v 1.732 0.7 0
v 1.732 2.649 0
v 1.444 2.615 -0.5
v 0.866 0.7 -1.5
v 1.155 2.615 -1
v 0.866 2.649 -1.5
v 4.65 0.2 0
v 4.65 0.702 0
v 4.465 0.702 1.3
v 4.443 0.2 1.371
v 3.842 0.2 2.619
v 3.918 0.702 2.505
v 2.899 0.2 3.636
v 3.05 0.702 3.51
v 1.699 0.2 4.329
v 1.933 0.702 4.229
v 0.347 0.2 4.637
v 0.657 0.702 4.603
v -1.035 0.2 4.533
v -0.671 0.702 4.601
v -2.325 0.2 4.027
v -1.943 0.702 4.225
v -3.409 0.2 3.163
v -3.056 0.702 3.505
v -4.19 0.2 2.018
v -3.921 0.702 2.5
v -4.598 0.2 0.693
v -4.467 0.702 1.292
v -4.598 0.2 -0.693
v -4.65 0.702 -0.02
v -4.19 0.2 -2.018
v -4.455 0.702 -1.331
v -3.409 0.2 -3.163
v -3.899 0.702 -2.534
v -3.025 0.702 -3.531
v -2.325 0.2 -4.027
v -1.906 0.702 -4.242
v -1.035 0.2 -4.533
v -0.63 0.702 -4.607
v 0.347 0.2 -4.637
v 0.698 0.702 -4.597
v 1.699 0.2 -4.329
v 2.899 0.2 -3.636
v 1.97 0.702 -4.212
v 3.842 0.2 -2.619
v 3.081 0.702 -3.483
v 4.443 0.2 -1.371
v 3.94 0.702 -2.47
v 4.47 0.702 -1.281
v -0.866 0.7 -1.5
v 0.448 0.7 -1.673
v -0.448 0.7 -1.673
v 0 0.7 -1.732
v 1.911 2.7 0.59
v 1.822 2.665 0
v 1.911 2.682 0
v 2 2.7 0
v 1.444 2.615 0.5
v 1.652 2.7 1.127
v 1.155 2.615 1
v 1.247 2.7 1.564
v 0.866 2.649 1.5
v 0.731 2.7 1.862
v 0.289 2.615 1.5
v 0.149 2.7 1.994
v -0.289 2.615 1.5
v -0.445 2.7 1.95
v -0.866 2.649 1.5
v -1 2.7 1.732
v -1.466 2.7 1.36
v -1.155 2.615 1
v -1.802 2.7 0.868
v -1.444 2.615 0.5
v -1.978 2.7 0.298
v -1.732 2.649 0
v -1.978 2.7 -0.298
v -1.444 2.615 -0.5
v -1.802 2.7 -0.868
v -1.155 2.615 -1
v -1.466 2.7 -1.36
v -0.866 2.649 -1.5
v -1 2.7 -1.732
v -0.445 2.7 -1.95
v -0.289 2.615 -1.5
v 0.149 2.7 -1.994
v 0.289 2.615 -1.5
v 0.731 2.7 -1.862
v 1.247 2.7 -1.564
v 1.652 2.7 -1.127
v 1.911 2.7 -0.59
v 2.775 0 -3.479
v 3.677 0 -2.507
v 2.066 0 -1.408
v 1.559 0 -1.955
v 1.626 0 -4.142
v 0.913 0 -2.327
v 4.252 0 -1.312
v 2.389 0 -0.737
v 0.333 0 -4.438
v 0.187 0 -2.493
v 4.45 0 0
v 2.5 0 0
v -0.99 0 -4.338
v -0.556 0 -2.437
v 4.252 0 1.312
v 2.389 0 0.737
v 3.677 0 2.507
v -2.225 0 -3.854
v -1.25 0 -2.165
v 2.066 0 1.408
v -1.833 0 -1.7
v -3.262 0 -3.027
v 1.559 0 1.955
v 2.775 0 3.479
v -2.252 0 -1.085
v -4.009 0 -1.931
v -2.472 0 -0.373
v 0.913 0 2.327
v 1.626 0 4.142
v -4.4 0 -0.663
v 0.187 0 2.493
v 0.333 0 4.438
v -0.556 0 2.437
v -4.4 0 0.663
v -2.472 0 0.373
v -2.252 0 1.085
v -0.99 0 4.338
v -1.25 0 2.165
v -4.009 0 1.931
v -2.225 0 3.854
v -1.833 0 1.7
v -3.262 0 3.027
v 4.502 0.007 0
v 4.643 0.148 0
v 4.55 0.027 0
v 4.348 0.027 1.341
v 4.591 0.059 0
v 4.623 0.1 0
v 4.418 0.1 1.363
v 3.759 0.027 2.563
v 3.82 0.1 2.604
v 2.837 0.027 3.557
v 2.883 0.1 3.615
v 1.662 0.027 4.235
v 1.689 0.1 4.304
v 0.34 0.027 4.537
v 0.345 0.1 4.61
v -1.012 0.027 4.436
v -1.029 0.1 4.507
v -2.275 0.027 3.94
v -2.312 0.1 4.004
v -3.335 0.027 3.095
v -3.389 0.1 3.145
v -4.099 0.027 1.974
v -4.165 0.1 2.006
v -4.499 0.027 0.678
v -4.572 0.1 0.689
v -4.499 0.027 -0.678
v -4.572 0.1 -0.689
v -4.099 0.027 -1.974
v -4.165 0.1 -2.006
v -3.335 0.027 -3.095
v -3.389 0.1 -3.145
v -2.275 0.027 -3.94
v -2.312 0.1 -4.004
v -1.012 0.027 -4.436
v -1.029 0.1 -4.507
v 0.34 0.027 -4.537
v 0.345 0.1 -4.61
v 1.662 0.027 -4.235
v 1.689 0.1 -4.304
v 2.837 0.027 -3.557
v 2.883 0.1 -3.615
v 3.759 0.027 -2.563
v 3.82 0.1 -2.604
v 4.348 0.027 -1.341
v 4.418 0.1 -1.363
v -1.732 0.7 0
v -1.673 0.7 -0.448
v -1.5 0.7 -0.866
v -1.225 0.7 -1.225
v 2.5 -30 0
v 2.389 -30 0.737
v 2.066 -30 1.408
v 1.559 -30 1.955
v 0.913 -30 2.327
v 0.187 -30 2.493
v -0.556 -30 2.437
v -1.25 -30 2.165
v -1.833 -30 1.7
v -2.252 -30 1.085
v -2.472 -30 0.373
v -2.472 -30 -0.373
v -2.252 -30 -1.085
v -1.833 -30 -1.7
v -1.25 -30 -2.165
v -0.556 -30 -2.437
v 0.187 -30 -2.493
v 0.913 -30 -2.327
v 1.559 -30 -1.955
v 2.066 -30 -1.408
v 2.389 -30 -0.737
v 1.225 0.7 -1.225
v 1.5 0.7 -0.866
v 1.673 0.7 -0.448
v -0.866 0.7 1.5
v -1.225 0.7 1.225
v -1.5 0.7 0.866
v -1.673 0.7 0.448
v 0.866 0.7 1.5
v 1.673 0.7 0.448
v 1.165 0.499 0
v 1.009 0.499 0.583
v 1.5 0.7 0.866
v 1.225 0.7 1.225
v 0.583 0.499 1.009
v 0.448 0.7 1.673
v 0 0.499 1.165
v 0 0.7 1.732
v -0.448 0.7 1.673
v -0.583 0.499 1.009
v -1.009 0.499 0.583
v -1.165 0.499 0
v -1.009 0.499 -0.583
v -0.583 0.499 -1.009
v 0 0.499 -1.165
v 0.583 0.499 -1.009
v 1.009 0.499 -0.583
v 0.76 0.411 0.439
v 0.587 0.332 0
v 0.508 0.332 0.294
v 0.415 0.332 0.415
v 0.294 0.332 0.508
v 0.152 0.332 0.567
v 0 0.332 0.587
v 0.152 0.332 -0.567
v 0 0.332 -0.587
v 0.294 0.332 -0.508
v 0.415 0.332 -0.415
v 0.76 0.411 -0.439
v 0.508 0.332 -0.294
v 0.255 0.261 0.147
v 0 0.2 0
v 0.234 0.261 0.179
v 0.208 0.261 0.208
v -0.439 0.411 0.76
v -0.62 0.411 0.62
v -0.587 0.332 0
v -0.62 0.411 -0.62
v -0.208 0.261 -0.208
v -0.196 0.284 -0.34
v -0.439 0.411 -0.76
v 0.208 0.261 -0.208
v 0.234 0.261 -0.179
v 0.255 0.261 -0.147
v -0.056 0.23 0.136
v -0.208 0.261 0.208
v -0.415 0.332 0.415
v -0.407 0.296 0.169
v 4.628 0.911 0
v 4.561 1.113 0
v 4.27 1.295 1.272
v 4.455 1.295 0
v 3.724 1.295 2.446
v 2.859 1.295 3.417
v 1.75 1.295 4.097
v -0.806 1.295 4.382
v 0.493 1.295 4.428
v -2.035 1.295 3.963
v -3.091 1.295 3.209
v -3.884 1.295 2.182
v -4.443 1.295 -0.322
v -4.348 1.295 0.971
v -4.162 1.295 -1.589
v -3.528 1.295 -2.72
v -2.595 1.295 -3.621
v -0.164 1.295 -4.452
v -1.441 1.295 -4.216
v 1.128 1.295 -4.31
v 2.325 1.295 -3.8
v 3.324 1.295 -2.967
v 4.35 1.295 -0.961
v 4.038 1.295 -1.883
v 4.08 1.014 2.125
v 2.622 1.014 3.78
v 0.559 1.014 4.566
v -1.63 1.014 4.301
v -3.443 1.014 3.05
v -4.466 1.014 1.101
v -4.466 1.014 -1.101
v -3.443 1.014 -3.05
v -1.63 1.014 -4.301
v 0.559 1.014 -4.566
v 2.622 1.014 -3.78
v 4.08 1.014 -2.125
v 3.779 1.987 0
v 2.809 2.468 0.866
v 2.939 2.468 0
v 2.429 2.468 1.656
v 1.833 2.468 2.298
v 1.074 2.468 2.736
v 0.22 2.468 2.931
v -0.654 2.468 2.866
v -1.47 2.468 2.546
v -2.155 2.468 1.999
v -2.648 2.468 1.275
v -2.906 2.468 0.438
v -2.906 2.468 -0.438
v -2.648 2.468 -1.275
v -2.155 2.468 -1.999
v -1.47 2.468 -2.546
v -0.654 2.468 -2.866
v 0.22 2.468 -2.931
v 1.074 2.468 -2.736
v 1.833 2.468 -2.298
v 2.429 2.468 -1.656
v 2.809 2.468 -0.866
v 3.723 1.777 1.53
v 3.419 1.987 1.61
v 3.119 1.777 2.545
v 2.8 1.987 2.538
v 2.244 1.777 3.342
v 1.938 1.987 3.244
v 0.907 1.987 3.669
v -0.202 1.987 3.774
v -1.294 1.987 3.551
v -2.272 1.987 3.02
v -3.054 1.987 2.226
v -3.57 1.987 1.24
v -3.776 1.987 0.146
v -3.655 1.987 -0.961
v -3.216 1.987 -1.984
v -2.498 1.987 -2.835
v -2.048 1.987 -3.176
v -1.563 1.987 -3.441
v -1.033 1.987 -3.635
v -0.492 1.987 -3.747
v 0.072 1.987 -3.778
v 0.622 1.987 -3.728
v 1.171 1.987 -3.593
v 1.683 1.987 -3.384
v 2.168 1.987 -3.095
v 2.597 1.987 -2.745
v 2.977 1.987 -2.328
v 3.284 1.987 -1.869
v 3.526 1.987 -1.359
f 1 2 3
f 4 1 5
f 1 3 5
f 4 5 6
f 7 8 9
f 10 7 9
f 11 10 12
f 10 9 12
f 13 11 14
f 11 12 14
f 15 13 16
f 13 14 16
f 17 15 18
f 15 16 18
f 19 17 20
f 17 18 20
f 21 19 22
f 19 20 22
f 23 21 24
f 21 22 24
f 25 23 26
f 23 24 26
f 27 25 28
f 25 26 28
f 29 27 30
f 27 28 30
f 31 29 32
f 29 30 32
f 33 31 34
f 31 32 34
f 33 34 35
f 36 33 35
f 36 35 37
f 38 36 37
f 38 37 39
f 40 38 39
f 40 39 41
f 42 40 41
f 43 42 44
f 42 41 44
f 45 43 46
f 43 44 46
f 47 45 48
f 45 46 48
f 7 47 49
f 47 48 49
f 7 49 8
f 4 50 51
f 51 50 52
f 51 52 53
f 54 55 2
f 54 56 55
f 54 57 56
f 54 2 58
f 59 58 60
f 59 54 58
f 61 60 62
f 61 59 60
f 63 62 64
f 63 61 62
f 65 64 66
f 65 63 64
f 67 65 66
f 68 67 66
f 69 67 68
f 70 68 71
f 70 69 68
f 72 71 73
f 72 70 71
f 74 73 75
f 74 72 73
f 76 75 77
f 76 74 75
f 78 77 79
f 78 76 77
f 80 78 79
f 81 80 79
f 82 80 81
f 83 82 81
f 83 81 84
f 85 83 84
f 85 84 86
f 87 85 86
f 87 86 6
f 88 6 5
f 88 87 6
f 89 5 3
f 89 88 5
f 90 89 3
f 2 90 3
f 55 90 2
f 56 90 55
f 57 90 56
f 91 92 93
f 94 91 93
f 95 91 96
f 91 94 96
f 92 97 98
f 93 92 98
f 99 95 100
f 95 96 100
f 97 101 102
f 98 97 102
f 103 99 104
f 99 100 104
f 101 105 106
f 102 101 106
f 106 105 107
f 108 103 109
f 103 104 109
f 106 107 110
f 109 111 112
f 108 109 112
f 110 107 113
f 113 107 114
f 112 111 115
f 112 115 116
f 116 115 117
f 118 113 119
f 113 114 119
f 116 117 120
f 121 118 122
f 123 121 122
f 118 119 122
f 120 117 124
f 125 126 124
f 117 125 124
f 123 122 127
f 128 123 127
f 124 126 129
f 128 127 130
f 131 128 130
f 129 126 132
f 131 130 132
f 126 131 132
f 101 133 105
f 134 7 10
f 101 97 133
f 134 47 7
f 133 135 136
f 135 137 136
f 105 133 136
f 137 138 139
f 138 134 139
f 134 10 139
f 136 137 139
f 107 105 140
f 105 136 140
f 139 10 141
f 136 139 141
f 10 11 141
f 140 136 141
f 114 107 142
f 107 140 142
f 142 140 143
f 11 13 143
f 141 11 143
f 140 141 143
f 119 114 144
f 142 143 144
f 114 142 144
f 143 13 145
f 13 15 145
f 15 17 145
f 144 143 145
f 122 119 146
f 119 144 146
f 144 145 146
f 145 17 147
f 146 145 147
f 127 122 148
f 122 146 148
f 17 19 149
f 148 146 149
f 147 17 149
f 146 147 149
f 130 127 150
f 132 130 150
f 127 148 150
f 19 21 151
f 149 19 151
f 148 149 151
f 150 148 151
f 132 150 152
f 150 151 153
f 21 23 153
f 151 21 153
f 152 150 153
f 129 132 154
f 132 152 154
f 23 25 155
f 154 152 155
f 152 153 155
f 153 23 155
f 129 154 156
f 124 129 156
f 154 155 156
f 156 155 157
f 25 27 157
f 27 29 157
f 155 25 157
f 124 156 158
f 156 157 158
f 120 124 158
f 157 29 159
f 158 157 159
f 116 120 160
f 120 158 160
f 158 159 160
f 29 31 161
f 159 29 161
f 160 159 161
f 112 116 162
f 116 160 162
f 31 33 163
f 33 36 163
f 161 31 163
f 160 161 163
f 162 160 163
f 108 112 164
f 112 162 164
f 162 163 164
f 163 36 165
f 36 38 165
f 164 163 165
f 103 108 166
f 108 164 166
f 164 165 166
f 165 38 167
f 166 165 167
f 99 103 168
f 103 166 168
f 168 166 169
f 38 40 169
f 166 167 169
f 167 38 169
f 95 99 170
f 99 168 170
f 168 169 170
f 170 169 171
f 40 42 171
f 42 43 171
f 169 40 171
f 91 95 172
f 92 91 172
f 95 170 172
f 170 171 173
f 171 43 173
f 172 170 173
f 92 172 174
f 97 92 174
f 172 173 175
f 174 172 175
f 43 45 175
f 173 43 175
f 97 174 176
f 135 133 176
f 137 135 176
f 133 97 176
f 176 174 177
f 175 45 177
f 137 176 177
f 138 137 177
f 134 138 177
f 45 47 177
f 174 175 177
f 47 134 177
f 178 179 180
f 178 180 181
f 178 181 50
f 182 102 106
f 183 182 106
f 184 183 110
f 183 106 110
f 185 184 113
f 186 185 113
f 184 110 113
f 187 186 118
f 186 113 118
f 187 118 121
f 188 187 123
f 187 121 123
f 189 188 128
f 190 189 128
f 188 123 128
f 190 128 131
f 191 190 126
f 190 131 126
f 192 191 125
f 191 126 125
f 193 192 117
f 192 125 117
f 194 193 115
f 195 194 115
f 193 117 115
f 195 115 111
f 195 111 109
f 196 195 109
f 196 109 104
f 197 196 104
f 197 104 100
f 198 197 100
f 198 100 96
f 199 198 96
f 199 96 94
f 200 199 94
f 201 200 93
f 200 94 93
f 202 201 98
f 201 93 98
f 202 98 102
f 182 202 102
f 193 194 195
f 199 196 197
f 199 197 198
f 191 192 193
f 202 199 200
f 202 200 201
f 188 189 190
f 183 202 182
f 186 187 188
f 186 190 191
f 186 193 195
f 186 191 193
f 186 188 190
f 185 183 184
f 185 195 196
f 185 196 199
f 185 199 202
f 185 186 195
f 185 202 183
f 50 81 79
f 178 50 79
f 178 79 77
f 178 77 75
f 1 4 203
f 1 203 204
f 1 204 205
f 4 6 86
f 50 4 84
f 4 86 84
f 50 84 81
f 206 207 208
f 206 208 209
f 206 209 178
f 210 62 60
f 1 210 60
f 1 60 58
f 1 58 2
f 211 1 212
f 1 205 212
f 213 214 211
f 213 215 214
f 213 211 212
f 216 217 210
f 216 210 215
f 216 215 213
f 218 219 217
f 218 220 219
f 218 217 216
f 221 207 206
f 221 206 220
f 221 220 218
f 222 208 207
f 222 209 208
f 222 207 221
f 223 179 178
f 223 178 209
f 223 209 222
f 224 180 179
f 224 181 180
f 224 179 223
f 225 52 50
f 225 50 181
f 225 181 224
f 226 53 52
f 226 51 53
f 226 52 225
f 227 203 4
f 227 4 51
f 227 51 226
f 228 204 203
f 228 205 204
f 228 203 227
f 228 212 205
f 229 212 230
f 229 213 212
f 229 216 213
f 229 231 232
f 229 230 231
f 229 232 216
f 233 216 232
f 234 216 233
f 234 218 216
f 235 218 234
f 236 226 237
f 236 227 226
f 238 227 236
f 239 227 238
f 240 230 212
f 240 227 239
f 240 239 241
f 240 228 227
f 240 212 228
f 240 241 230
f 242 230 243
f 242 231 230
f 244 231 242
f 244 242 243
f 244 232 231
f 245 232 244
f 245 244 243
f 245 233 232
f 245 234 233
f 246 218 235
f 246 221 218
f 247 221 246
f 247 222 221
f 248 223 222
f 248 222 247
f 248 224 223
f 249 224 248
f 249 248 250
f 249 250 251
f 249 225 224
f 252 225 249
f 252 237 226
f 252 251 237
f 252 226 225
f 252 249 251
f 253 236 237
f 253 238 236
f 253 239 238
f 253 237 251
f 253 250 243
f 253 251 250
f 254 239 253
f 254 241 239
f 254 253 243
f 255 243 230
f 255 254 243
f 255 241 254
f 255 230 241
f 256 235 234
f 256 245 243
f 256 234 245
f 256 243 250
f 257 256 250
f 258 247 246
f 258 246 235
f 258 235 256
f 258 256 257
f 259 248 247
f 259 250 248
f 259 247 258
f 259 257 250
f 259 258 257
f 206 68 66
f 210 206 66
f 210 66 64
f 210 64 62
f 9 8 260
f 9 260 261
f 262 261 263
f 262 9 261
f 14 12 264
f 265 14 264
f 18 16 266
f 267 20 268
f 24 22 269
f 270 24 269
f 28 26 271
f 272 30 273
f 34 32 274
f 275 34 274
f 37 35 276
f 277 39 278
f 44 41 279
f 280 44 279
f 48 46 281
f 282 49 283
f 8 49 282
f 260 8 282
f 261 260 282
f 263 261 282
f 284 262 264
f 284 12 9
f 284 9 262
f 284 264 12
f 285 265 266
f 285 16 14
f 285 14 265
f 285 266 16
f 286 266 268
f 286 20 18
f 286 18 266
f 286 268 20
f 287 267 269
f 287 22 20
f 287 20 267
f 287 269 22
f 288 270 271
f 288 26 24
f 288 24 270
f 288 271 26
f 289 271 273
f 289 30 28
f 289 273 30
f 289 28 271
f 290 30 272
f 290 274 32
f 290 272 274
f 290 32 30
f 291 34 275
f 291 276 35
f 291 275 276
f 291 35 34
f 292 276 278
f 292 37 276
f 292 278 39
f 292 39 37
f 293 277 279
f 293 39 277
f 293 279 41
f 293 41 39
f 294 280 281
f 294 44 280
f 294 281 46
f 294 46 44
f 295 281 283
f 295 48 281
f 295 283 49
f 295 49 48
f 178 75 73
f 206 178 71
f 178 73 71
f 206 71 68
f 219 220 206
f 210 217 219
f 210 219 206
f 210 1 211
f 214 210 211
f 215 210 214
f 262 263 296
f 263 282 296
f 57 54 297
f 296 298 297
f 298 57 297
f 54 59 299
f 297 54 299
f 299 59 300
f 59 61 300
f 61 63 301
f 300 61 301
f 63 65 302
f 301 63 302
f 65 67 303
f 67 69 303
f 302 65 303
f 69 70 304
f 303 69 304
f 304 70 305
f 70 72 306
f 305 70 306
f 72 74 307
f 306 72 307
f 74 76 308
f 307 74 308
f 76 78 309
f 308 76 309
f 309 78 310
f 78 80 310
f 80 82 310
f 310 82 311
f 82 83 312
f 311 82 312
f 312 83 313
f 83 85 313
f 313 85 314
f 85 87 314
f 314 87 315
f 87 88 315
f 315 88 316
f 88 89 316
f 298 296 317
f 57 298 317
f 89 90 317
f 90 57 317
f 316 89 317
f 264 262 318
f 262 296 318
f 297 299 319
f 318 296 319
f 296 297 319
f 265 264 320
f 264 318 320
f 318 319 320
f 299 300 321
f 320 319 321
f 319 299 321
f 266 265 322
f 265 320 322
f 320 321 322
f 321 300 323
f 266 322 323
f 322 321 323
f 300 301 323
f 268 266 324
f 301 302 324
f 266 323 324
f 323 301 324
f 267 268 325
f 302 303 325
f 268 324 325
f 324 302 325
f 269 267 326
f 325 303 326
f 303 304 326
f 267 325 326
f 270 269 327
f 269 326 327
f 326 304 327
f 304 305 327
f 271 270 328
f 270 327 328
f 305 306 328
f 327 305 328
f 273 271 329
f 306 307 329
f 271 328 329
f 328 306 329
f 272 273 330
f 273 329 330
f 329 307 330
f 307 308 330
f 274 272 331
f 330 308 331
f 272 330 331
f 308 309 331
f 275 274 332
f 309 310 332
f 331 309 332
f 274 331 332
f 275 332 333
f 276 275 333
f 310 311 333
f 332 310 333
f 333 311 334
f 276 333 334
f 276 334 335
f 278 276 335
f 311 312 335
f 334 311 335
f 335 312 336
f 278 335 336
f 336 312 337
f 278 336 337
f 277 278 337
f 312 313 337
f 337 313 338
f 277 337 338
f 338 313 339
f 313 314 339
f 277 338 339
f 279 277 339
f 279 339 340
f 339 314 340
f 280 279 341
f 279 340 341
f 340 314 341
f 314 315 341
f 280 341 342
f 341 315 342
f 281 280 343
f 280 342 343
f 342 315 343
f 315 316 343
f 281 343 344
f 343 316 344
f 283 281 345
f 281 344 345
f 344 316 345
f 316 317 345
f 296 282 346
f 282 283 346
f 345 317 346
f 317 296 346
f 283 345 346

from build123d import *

# Parameters (mm, degrees)
FILLET1_R           = 0.2
FILLET2_R           = 1
SKETCH2_R           = 2.5
BOSS_EXTRUDE1_DEPTH = 30
CUT_EXTRUDE1_DEPTH  = 2


with BuildPart() as part:
    # Sketch1 → Revolve1 (revolve)
    with BuildSketch(Plane.XY):
        with BuildLine():
            Line((0, 0), (4.65, 0))
            Line((4.65, 0), (4.65, 1))
            ThreePointArc((4.65, 1), (3.526943142, 2.164793721), (2, 2.7))
            Line((2, 2.7), (0, 2.7))
            Line((0, 2.7), (0, 0))
        make_face()
    revolve(axis=Axis((0, 55, 0), (0, -1, 0)))

    # Fillet1
    fillet1_edges = [part.edges().sort_by_distance(p)[0] for p in [
        (-4.65, 0, 0),
    ]]
    fillet(fillet1_edges, radius=FILLET1_R)

    # Fillet2
    fillet2_edges = [part.edges().sort_by_distance(p)[0] for p in [
        (-4.65, 1, 0),
    ]]
    fillet(fillet2_edges, radius=FILLET2_R)

    # Sketch2 → Boss-Extrude1 (add)
    with BuildSketch(Plane.XZ):
        Circle(SKETCH2_R)
    extrude(amount=BOSS_EXTRUDE1_DEPTH)

    # Sketch6 → Revolve2 (revolve)
    with BuildSketch(Plane.XY):
        Polygon((0, 0), (0, 2.7), (1.274203424, 2.7), (4.45, 0), align=None)
    revolve(axis=Axis((0, 55, 0), (0, -1, 0)))

    # Sketch7 → Cut-Extrude1 (cut)
    with BuildSketch(Plane(origin=(0, 2.7, 0), x_dir=(1, 0, 0), z_dir=(0, 1, 0))):
        Polygon((0.866025404, -1.5), (1.732050808, 0), (0.866025404, 1.5), (-0.866025404, 1.5), (-1.732050808, 0), (-0.866025404, -1.5), align=None)
    extrude(amount=-CUT_EXTRUDE1_DEPTH, mode=Mode.SUBTRACT)

    # Sketch8 → Cut-Revolve1 (revolve, cut)
    with BuildSketch(Plane.XY):
        with BuildLine():
            Line((0, 0.7), (0, 0.2))
            ThreePointArc((0, 0.2), (0.877315732, 0.410889157), (1.732050808, 0.7))
            Line((1.732050808, 0.7), (0, 0.7))
        make_face()
    revolve(axis=Axis((0, 55, 0), (0, -1, 0)), mode=Mode.SUBTRACT)

    # Sketch9 → Cut-Revolve2 (revolve, cut)
    with BuildSketch(Plane.XY):
        with BuildLine():
            ThreePointArc((0, 2.497958971), (1.00508962, 2.548597441), (2, 2.7))
            Line((2, 2.7), (0, 2.7))
            Line((0, 2.7), (0, 2.497958971))
        make_face()
    revolve(axis=Axis((0, 55, 0), (0, -1, 0)), mode=Mode.SUBTRACT)


solid = part.part
